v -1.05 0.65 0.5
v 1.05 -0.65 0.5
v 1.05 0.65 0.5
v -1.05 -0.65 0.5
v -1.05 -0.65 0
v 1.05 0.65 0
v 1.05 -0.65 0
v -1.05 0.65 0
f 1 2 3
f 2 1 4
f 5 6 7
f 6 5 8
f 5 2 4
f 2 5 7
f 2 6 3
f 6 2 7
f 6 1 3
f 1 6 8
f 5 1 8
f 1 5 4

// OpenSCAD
// SMD resistors
module smd_res(type){
    
    // Select following type-size:
    //		0	0402 / 1005
    //		1	0603 / 1608
    //		2	0805 / 2012
    //		3	1206 / 3216
    //		4	1210 / 3225
    //		5	2010 / 5025
    //		6	2512 / 6332

    l	= [1.0, 1.6, 2.1, 3.1, 3.1, 5.0, 6.35];
    w	= [0.5, 0.85, 1.3, 1.6, 2.6, 2.5, 3.2];
    h	= [0.35, 0.45, 0.5, 0.55, 0.55, 0.55, 0.55];
    d	= [0.25, 0.3, 0.4, 0.5, 0.4, 0.4, 0.4];
    t	= [0.2, 0.3, 0.4, 0.5, 0.5, 0.6, 0.6];

	translate([-l[type]/2, -w[type]/2, 0]){
        cube([l[type], w[type], h[type]]);
    }
    
} // smd_res

smd_res(2);
